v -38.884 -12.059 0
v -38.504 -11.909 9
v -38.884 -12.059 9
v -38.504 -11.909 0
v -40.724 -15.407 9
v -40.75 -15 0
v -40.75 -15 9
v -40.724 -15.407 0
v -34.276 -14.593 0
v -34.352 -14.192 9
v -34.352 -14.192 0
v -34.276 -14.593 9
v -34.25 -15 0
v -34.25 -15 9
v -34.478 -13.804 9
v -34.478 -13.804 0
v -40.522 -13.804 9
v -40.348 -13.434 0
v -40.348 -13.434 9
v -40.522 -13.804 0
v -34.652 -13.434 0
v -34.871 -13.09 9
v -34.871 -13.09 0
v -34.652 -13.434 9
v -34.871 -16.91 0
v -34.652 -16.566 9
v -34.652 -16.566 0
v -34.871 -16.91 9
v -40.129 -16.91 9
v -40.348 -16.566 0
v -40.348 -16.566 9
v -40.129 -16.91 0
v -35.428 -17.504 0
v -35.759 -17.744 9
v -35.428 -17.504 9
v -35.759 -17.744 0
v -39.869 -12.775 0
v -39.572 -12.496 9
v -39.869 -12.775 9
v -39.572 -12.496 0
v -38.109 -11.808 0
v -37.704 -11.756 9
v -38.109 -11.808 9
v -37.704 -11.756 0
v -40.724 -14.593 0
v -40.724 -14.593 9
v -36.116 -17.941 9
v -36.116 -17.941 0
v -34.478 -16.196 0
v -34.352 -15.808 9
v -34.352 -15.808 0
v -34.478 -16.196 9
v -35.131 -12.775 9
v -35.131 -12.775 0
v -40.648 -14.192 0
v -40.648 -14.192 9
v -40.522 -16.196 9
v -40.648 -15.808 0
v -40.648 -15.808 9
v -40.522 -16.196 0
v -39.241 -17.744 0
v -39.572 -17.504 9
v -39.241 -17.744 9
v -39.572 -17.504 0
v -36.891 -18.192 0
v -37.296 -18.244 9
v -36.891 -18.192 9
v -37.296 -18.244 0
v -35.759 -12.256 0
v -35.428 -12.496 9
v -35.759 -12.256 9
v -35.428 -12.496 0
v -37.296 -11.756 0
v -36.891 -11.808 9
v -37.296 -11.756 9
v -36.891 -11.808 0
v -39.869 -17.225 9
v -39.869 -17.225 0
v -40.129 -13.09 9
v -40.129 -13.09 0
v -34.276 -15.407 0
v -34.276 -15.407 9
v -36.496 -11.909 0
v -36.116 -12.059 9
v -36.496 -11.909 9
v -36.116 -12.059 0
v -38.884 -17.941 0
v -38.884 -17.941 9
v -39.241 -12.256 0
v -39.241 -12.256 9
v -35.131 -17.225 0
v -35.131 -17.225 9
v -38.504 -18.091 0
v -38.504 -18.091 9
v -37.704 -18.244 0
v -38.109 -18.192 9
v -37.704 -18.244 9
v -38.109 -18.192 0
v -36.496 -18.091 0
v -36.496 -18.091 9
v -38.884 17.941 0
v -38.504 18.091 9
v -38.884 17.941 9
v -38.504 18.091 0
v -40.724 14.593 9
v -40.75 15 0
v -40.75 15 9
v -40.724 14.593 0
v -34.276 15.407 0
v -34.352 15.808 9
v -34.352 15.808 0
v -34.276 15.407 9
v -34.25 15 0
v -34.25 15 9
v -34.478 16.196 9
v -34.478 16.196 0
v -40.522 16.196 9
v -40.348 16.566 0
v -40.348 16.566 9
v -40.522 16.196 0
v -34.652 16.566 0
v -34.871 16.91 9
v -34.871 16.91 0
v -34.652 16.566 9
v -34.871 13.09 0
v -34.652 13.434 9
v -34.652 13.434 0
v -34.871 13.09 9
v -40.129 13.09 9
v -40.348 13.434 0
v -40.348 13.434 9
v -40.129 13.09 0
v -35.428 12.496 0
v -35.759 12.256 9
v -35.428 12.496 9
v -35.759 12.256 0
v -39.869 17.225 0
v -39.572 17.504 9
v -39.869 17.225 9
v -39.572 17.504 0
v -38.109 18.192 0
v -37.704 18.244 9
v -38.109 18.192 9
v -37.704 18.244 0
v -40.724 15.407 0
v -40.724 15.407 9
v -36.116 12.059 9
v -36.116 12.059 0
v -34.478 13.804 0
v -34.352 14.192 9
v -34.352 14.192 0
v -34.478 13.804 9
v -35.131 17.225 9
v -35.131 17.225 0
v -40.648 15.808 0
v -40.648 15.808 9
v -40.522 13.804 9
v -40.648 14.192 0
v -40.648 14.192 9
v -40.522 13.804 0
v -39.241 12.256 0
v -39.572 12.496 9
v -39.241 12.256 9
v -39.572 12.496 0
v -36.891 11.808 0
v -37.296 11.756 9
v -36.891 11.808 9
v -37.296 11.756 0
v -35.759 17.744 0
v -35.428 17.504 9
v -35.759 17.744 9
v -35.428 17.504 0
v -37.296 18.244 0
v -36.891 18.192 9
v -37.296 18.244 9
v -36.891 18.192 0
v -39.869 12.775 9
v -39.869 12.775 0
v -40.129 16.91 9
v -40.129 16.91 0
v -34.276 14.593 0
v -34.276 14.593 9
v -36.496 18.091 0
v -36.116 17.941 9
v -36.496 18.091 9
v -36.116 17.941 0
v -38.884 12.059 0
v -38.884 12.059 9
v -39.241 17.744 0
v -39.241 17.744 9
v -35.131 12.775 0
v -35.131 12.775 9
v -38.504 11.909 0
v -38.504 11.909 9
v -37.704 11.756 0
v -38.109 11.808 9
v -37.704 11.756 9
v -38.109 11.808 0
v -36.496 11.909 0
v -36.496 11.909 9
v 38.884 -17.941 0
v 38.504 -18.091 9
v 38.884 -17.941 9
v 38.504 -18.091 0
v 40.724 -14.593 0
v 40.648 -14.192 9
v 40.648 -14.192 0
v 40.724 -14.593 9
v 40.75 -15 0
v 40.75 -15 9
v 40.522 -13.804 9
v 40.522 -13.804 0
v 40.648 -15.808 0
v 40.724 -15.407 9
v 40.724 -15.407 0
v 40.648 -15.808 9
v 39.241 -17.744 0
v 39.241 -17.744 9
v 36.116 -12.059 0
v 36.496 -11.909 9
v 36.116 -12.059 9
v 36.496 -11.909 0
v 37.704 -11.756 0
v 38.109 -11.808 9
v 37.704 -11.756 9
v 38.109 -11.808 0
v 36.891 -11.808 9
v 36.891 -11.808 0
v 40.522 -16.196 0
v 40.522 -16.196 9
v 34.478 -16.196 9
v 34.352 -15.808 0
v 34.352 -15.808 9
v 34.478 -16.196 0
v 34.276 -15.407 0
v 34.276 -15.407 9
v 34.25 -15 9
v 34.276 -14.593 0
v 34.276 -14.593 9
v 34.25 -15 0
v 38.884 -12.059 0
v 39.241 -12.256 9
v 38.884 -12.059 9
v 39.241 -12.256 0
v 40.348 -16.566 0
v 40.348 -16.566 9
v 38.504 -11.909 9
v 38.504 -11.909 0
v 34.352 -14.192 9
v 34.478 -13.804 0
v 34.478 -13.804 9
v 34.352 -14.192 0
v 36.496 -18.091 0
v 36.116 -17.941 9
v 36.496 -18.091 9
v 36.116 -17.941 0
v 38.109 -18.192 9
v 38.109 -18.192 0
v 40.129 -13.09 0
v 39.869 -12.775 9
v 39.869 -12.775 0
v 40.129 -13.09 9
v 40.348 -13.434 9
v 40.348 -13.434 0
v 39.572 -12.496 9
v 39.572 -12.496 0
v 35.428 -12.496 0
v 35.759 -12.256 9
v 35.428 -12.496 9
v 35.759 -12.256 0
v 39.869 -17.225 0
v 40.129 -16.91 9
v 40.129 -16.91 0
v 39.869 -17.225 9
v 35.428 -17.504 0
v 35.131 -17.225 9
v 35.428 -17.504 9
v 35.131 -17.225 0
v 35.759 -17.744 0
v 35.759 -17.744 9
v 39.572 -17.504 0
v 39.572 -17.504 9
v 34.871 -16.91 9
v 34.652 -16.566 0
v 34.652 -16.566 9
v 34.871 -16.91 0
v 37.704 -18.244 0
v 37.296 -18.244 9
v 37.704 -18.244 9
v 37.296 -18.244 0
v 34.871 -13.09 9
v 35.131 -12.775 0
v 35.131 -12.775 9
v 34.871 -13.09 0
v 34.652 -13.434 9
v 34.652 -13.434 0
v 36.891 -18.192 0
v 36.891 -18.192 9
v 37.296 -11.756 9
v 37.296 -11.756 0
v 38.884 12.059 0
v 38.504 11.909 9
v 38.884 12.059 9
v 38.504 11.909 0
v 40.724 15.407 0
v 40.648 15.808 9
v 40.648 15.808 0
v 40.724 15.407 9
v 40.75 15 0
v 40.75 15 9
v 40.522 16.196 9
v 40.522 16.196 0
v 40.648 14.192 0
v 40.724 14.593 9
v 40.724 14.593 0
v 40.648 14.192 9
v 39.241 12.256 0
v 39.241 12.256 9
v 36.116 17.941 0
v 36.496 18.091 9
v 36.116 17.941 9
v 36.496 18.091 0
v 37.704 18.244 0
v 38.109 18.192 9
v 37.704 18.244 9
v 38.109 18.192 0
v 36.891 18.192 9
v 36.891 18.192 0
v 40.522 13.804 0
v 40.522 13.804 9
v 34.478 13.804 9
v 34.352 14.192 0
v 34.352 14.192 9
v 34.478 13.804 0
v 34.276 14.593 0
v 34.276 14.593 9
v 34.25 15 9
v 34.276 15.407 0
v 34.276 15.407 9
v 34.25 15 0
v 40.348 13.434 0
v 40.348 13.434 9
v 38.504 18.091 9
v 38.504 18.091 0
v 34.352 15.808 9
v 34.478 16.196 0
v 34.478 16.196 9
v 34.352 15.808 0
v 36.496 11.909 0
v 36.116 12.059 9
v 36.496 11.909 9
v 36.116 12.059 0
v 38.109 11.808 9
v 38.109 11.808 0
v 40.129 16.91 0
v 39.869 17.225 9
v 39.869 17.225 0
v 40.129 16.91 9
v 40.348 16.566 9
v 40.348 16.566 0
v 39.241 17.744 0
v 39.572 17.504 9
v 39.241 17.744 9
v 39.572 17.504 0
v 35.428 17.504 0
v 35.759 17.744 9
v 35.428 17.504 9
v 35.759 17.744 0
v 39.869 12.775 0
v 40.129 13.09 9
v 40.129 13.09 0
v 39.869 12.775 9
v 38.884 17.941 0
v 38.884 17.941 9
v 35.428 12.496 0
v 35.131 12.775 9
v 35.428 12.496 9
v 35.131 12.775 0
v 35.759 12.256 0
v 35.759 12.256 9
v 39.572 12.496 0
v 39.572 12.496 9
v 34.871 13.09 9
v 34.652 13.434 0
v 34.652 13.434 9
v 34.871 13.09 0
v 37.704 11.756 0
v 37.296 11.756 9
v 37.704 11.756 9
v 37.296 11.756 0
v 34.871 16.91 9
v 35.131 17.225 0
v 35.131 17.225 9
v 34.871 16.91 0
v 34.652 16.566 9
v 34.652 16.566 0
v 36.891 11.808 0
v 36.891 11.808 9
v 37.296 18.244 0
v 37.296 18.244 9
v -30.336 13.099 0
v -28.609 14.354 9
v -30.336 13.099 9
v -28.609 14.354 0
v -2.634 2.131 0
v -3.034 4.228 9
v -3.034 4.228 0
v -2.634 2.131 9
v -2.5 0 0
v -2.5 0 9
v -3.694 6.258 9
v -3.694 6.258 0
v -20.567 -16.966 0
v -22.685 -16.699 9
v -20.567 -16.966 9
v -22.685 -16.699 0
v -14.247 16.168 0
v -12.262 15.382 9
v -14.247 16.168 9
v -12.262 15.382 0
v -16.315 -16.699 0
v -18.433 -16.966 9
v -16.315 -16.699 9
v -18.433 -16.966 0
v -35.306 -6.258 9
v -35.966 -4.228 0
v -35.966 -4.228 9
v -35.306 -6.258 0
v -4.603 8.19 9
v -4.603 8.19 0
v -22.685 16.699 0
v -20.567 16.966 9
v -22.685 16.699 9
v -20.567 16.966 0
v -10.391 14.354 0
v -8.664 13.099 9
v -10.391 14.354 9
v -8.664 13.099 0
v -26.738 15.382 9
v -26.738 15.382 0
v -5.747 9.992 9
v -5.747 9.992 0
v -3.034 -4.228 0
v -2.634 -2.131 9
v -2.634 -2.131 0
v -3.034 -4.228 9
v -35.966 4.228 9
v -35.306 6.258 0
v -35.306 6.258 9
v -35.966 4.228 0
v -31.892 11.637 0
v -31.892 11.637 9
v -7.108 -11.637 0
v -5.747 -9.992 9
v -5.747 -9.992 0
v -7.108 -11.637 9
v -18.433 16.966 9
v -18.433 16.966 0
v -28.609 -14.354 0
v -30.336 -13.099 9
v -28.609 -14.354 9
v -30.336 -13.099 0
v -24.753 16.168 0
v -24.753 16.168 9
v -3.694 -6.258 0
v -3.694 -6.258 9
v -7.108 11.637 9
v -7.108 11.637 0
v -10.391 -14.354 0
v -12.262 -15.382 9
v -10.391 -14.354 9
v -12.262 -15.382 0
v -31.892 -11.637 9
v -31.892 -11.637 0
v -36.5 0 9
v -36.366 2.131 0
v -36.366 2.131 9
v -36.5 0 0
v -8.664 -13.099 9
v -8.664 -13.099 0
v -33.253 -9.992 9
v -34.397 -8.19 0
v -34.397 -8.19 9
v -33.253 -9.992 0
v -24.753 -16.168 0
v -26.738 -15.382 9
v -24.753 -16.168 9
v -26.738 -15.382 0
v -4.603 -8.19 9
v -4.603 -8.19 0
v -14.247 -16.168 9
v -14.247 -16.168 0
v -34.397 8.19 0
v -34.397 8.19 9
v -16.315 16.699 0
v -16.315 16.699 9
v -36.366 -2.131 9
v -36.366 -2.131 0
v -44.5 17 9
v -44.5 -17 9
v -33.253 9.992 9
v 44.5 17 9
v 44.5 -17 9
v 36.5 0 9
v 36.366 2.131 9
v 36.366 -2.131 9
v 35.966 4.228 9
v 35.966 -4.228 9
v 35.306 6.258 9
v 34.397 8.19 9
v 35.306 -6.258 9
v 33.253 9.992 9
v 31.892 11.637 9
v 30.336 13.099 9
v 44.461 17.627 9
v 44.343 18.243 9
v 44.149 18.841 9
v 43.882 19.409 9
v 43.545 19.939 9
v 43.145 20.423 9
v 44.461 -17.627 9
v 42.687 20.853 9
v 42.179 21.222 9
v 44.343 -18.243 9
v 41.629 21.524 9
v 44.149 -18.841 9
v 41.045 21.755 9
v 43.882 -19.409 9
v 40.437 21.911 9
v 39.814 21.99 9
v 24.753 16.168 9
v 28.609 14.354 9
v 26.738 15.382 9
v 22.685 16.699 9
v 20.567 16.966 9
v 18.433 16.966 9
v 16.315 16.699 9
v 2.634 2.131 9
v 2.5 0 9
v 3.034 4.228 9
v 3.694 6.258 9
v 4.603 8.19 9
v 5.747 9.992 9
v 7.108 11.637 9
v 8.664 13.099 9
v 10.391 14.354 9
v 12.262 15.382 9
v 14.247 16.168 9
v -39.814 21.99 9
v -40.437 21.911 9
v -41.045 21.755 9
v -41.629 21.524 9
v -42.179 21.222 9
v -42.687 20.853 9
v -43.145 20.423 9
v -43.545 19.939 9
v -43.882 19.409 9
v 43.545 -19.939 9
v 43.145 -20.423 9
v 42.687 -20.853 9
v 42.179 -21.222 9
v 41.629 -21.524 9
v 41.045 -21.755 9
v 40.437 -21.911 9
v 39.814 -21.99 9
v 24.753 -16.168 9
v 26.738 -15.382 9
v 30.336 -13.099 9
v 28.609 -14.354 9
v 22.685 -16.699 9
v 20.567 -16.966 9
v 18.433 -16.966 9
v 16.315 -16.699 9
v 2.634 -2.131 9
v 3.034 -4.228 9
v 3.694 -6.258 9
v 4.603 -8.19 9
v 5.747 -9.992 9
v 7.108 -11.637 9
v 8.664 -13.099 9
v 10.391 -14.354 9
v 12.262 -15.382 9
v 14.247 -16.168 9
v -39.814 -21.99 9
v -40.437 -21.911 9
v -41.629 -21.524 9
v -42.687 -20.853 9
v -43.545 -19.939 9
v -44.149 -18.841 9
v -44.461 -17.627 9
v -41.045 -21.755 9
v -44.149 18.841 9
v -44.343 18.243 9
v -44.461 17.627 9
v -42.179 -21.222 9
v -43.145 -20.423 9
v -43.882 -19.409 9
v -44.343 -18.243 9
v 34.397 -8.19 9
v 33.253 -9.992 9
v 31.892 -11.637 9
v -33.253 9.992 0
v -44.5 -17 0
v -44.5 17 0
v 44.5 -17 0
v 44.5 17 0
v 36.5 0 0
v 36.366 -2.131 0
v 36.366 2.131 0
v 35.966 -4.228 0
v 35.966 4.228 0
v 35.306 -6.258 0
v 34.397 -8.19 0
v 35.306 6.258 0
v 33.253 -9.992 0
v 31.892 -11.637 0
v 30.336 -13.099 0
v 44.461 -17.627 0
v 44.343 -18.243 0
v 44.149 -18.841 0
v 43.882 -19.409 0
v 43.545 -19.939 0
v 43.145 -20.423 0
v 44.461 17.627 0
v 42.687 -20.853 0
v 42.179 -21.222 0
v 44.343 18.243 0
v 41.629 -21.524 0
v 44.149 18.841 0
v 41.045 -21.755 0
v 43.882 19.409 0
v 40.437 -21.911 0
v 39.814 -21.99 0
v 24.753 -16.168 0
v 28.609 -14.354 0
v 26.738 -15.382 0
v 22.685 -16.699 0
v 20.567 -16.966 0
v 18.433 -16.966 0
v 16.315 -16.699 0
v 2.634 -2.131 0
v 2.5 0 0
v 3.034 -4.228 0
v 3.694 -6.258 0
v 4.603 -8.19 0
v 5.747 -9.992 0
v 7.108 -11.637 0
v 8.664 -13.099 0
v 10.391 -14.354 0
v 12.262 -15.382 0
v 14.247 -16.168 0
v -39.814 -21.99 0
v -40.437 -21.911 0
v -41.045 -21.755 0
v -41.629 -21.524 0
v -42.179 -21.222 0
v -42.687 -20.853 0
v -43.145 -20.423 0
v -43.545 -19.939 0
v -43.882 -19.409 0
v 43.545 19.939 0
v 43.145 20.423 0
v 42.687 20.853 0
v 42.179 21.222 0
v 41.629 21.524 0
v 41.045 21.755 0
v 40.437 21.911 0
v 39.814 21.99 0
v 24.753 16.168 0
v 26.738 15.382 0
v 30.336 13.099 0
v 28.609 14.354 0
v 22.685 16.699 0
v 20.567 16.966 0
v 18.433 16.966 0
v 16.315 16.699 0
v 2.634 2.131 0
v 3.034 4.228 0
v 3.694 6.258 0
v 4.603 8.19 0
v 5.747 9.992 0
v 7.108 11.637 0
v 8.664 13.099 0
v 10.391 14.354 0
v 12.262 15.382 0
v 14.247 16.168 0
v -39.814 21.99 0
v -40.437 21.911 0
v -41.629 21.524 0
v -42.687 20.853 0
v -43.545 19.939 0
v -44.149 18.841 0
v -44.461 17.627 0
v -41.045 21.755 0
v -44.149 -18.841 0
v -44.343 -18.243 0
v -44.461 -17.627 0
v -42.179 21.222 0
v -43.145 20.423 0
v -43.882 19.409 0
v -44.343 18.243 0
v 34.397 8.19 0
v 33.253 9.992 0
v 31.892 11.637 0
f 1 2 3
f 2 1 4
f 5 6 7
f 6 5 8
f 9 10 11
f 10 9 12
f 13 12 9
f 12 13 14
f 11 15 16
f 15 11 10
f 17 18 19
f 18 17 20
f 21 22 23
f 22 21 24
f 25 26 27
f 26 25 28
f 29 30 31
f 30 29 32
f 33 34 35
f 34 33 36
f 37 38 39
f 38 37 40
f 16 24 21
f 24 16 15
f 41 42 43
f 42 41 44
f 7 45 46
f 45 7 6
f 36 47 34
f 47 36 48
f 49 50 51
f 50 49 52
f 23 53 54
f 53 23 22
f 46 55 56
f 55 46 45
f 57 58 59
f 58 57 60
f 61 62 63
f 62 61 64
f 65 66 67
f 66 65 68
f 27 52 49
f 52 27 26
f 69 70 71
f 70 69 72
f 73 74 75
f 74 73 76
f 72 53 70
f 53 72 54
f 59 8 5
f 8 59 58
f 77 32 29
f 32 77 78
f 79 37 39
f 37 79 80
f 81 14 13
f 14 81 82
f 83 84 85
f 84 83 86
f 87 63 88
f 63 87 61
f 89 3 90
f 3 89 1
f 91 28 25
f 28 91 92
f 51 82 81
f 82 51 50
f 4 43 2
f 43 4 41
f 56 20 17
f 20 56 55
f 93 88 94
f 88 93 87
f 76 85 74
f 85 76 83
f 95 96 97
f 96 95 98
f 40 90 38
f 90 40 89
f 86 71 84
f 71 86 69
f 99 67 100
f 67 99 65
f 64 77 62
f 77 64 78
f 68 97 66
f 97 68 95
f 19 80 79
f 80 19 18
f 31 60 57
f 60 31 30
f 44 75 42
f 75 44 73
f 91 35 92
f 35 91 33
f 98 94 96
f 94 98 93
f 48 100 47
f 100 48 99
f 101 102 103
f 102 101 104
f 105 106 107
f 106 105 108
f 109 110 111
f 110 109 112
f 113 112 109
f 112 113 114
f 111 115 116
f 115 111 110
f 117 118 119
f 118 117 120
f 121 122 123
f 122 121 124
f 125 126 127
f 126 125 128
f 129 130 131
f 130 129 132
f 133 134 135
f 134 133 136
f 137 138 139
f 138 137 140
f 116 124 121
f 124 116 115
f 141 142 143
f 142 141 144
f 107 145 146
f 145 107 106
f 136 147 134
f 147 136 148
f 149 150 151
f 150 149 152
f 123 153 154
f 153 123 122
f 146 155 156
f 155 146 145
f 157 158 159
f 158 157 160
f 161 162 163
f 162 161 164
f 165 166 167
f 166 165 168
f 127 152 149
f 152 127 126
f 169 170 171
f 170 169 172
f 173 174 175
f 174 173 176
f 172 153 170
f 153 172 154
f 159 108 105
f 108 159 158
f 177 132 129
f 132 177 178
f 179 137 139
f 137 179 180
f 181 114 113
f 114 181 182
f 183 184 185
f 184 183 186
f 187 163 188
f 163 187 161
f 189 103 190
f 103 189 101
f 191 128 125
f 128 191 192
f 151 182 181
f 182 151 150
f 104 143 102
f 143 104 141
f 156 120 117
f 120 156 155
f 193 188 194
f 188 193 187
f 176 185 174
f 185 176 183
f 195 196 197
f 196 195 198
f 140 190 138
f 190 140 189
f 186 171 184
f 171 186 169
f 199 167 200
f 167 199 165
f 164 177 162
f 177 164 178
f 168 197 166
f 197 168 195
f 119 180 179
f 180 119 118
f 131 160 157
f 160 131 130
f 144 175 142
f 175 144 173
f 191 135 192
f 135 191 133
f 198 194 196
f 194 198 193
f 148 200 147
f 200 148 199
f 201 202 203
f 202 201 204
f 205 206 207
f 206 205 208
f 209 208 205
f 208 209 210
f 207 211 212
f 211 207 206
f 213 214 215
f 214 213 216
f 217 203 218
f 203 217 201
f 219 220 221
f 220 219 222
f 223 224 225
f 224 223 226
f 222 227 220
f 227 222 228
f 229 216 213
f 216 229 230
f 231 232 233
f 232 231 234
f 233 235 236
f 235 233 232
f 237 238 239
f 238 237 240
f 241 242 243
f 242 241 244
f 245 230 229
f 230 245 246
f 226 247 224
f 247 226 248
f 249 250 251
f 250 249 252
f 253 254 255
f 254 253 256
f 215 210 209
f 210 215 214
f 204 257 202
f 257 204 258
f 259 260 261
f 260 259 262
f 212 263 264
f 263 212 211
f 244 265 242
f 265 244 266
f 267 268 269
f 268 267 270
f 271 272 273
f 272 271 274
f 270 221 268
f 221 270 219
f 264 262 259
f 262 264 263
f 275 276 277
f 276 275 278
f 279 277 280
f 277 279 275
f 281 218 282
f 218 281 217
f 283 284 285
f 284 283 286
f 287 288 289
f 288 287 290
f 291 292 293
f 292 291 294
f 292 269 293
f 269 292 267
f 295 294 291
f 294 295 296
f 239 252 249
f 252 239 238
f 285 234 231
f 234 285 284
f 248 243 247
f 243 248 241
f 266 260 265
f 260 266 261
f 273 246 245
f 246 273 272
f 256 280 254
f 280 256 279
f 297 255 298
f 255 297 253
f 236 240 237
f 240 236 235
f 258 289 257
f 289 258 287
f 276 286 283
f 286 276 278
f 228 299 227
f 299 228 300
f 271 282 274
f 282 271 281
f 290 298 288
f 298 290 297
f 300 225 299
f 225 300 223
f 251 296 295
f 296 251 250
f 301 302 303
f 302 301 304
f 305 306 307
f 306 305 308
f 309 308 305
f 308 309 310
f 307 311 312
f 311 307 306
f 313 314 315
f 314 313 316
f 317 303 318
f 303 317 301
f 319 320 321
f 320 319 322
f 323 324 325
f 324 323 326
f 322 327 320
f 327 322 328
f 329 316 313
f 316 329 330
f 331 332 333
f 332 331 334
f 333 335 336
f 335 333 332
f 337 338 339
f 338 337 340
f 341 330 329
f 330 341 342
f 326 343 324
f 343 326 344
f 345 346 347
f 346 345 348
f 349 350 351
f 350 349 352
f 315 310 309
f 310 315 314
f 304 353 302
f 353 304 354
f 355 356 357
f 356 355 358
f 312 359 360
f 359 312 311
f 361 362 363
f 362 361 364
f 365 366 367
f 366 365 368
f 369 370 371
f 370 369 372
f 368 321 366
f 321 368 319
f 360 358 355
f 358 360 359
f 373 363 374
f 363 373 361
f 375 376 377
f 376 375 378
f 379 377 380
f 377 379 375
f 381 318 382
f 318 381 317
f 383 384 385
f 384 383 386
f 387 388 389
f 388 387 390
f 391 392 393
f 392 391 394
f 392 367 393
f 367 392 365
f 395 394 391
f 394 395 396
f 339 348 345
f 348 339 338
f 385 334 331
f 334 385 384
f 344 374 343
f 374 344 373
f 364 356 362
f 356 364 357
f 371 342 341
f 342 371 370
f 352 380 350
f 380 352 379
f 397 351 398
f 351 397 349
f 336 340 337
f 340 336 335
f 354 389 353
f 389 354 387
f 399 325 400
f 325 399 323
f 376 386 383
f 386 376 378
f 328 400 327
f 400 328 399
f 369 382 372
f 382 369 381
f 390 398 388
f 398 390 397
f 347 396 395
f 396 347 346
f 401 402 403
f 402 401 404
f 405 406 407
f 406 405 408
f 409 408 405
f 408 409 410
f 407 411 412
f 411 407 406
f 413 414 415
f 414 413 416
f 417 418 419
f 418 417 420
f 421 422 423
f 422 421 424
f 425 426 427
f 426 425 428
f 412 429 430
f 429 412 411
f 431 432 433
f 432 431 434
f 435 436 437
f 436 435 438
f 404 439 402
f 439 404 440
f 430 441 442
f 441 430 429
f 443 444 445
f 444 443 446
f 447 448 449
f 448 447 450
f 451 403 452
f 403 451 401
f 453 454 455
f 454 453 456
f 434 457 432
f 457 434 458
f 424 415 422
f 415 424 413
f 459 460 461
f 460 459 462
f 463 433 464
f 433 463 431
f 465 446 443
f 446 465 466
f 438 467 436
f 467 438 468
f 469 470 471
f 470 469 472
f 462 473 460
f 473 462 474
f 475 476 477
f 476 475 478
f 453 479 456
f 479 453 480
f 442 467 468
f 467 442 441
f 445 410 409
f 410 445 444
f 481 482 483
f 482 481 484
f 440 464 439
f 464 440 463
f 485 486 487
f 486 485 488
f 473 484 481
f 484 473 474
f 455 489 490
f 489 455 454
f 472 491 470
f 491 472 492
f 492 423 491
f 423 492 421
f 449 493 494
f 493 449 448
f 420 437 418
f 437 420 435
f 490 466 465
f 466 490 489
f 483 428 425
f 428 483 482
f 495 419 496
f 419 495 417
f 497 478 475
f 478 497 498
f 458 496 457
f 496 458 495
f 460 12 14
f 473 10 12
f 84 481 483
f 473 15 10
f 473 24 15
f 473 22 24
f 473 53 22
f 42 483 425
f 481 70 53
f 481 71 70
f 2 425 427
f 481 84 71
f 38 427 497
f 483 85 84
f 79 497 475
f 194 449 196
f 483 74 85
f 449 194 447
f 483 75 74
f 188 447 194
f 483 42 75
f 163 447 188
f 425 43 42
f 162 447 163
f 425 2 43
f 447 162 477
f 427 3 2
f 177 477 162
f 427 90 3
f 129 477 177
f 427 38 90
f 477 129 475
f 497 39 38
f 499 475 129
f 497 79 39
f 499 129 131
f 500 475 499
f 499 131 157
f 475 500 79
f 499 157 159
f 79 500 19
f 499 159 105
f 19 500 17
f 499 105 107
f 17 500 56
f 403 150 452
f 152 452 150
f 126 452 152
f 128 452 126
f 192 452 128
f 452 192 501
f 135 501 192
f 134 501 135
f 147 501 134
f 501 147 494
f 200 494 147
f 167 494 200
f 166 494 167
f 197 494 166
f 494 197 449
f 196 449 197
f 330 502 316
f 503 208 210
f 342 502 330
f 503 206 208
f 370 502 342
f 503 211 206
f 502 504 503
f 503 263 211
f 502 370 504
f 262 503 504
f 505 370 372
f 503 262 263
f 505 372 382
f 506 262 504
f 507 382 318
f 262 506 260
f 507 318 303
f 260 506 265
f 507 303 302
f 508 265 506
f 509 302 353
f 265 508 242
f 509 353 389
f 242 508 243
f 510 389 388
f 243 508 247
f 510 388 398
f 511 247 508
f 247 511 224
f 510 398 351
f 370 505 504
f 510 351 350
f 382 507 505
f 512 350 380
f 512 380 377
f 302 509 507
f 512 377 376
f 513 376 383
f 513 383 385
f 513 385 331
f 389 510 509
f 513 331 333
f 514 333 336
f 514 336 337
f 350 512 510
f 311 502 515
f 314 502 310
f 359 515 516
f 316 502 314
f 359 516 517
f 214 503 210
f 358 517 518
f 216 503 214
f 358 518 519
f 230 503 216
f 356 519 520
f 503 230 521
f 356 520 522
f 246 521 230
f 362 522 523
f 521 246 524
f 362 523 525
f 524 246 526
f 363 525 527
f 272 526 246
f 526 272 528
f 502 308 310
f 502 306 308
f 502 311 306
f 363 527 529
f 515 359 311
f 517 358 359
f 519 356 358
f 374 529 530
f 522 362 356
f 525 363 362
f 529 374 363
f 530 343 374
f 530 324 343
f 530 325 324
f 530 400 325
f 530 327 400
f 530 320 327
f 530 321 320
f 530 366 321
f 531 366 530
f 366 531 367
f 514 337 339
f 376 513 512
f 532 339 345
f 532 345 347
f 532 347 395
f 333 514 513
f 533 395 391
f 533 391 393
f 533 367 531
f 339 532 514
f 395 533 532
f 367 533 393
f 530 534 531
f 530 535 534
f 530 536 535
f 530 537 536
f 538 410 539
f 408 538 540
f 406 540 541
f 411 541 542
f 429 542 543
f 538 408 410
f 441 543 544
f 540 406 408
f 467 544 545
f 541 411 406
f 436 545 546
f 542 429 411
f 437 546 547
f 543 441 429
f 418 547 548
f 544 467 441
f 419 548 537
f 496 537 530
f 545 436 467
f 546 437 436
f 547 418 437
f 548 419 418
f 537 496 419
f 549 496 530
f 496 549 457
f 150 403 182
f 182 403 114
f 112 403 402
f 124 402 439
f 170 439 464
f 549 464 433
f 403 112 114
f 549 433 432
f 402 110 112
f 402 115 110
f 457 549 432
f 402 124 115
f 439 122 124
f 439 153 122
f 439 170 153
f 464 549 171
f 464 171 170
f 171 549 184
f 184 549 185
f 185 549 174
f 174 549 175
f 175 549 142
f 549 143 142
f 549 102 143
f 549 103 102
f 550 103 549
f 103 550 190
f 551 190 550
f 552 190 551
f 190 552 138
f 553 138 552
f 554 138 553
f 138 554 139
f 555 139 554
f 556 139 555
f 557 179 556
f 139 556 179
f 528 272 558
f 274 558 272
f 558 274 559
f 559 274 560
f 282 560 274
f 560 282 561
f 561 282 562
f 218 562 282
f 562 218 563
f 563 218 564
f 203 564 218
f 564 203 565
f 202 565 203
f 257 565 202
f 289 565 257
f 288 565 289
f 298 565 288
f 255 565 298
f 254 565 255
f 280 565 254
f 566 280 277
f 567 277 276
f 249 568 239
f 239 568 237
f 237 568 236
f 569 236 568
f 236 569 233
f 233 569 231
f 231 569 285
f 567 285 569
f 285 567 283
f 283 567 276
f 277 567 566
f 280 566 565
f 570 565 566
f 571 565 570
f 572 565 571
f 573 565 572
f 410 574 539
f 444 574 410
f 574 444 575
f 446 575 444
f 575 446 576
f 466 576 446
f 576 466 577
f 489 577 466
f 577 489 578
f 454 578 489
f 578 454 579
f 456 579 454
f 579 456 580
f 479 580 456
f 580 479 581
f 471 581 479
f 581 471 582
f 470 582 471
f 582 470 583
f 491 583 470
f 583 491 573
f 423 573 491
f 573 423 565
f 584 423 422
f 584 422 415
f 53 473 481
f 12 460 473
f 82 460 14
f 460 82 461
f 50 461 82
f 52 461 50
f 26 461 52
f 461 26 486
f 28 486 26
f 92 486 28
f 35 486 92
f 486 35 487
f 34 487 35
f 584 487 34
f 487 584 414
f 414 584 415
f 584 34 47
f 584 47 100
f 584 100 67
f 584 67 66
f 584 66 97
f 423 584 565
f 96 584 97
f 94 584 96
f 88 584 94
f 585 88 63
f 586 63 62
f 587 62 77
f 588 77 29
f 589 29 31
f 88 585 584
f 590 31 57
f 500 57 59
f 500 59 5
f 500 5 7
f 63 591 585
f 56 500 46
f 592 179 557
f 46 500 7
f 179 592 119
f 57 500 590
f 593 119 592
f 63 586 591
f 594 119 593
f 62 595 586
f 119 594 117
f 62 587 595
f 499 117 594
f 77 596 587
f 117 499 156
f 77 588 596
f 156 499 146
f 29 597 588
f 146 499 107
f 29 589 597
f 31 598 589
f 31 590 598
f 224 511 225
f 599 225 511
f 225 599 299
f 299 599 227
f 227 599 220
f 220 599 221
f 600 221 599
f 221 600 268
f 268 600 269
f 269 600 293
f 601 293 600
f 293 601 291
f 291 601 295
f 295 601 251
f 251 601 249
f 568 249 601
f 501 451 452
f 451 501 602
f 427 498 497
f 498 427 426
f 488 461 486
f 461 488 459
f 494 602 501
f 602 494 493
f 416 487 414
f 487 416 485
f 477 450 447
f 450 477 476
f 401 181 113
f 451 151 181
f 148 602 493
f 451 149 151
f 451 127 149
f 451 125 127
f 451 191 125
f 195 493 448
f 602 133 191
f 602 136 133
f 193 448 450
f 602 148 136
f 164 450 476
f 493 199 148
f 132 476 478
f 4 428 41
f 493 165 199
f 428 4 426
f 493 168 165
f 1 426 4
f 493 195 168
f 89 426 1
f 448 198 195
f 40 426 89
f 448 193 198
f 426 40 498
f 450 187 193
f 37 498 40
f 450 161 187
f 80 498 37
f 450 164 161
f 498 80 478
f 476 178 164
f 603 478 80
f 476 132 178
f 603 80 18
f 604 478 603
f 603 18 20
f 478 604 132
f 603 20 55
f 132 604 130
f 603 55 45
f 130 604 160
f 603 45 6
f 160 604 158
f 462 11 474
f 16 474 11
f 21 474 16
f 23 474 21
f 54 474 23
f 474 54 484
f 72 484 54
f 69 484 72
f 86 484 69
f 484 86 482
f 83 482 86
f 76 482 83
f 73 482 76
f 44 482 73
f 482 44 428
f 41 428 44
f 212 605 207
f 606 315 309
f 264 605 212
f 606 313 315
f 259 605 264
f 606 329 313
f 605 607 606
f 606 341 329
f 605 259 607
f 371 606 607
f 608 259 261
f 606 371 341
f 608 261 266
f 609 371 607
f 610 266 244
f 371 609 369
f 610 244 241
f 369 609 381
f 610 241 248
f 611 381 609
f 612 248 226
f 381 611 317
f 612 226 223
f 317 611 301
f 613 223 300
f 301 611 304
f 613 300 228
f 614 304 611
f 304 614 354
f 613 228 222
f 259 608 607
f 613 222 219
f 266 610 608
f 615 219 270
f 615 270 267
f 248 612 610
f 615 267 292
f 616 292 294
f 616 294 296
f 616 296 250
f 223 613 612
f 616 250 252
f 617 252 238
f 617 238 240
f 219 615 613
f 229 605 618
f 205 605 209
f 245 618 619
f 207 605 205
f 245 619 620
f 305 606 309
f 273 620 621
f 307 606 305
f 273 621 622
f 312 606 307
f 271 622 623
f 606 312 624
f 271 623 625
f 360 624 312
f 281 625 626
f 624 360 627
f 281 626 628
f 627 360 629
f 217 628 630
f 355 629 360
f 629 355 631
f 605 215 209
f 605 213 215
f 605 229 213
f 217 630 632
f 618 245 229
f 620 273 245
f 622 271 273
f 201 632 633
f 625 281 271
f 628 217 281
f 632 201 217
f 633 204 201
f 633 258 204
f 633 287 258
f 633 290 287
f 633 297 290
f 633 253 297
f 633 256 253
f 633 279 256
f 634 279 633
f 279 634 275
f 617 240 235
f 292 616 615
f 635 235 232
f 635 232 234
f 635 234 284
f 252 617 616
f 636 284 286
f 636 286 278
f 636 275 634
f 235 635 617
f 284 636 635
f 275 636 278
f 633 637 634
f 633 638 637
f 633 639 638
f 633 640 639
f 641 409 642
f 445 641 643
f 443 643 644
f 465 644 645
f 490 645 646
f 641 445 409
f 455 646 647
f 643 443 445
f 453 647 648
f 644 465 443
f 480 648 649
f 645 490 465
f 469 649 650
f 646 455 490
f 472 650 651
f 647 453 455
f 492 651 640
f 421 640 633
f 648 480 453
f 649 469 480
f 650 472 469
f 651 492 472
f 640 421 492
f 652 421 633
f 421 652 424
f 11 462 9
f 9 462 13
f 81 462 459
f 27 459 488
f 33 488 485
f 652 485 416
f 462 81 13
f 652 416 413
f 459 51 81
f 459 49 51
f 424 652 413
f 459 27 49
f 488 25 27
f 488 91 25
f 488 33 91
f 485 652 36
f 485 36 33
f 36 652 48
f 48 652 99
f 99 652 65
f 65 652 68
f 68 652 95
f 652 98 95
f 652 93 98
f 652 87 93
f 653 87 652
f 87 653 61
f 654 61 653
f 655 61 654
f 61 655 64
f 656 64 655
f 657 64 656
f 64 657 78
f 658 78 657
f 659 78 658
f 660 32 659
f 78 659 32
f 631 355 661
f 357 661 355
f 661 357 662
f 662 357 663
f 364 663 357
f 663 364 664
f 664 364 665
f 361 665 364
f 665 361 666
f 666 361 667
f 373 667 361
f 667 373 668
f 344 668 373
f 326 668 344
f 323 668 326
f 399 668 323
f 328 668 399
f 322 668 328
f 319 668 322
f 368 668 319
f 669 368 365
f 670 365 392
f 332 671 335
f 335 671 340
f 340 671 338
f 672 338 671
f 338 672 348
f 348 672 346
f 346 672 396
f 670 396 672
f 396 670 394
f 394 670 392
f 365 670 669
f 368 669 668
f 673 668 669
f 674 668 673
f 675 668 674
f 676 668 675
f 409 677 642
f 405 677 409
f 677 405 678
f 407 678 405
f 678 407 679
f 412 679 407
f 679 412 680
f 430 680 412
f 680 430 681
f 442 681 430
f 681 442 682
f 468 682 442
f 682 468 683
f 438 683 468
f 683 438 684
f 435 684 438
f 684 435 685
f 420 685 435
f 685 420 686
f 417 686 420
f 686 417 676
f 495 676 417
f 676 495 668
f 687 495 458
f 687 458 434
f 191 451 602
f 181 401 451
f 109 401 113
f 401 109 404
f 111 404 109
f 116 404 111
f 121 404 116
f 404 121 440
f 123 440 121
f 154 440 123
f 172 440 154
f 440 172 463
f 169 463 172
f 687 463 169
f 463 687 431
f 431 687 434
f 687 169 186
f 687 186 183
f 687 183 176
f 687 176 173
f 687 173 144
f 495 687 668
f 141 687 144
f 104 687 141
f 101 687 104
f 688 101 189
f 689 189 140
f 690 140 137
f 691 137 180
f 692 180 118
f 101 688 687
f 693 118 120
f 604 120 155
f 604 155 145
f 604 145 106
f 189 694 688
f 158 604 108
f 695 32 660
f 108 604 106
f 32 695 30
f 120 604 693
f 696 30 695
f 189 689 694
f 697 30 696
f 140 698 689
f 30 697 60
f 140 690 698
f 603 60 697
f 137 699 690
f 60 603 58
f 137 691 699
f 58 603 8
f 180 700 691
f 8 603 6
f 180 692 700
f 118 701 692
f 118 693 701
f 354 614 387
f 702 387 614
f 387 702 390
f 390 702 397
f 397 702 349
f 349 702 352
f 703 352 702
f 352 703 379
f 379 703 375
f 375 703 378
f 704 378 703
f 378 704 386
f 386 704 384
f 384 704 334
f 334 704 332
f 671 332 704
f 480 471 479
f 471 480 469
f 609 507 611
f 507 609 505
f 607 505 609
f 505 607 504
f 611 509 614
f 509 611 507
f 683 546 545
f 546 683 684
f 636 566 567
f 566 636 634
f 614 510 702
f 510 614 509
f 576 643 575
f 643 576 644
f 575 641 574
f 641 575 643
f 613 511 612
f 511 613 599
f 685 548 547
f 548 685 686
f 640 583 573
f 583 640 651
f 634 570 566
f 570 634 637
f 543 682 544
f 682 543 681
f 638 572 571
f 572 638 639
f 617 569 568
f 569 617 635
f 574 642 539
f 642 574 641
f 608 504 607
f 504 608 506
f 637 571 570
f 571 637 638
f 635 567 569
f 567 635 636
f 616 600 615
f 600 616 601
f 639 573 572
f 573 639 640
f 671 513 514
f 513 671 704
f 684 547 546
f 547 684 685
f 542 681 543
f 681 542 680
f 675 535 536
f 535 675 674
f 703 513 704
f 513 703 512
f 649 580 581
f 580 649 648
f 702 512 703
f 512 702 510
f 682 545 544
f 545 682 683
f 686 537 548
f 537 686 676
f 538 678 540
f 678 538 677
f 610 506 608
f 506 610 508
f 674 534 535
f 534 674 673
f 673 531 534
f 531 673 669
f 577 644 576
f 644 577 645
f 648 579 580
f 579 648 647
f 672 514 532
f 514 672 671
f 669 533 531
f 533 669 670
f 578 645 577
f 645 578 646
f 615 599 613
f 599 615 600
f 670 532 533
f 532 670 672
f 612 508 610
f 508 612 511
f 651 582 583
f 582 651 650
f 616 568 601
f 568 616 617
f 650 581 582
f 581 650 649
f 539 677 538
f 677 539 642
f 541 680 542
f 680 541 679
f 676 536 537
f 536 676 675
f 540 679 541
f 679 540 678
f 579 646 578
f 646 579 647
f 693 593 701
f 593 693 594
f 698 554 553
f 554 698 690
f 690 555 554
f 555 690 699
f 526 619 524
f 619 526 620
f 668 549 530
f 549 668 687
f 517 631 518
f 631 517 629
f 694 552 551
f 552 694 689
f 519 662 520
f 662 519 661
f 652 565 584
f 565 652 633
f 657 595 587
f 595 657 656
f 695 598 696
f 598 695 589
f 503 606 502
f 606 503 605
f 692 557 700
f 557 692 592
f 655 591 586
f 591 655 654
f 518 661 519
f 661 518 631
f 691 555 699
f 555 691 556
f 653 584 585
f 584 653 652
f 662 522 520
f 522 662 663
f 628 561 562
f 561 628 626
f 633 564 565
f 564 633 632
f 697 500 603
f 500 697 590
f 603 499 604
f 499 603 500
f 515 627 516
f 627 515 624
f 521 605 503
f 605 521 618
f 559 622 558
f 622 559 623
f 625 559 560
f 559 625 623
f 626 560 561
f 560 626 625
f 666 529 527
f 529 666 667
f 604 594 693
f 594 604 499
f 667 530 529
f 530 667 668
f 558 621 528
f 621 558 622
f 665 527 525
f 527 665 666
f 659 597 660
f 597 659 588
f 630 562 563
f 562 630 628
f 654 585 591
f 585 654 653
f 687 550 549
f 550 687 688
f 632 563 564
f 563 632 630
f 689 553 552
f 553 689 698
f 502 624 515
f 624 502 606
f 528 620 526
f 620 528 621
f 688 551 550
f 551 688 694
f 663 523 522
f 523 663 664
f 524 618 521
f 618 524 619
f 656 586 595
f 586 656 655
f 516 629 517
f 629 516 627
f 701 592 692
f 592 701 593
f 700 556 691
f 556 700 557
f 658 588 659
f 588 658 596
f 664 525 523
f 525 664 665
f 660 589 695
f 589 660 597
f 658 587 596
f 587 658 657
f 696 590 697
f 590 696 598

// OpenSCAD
$fn = 50;

difference() {
	union() {
		hull() {
			translate(v = [-39.5, 17.0, 0]) {
				cylinder(h = 9, r = 5);
			}
			translate(v = [39.5, 17.0, 0]) {
				cylinder(h = 9, r = 5);
			}
			translate(v = [-39.5, -17.0, 0]) {
				cylinder(h = 9, r = 5);
			}
			translate(v = [39.5, -17.0, 0]) {
				cylinder(h = 9, r = 5);
			}
		}
	}
	union() {
		translate(v = [-37.5, -15.0, -100.0]) {
			cylinder(h = 200, r = 3.25);
		}
		translate(v = [-37.5, 15.0, -100.0]) {
			cylinder(h = 200, r = 3.25);
		}
		translate(v = [37.5, -15.0, -100.0]) {
			cylinder(h = 200, r = 3.25);
		}
		translate(v = [37.5, 15.0, -100.0]) {
			cylinder(h = 200, r = 3.25);
		}
		translate(v = [-37.5, -15.0, -100.0]) {
			cylinder(h = 200, r = 1.8);
		}
		translate(v = [-37.5, 15.0, -100.0]) {
			cylinder(h = 200, r = 1.8);
		}
		translate(v = [37.5, -15.0, -100.0]) {
			cylinder(h = 200, r = 1.8);
		}
		translate(v = [37.5, 15.0, -100.0]) {
			cylinder(h = 200, r = 1.8);
		}
		translate(v = [-19.5, 0, 0.0]) {
			cylinder(h = 9, r = 17.0);
		}
		translate(v = [19.5, 0, 0.0]) {
			cylinder(h = 9, r = 17.0);
		}
	}
}
